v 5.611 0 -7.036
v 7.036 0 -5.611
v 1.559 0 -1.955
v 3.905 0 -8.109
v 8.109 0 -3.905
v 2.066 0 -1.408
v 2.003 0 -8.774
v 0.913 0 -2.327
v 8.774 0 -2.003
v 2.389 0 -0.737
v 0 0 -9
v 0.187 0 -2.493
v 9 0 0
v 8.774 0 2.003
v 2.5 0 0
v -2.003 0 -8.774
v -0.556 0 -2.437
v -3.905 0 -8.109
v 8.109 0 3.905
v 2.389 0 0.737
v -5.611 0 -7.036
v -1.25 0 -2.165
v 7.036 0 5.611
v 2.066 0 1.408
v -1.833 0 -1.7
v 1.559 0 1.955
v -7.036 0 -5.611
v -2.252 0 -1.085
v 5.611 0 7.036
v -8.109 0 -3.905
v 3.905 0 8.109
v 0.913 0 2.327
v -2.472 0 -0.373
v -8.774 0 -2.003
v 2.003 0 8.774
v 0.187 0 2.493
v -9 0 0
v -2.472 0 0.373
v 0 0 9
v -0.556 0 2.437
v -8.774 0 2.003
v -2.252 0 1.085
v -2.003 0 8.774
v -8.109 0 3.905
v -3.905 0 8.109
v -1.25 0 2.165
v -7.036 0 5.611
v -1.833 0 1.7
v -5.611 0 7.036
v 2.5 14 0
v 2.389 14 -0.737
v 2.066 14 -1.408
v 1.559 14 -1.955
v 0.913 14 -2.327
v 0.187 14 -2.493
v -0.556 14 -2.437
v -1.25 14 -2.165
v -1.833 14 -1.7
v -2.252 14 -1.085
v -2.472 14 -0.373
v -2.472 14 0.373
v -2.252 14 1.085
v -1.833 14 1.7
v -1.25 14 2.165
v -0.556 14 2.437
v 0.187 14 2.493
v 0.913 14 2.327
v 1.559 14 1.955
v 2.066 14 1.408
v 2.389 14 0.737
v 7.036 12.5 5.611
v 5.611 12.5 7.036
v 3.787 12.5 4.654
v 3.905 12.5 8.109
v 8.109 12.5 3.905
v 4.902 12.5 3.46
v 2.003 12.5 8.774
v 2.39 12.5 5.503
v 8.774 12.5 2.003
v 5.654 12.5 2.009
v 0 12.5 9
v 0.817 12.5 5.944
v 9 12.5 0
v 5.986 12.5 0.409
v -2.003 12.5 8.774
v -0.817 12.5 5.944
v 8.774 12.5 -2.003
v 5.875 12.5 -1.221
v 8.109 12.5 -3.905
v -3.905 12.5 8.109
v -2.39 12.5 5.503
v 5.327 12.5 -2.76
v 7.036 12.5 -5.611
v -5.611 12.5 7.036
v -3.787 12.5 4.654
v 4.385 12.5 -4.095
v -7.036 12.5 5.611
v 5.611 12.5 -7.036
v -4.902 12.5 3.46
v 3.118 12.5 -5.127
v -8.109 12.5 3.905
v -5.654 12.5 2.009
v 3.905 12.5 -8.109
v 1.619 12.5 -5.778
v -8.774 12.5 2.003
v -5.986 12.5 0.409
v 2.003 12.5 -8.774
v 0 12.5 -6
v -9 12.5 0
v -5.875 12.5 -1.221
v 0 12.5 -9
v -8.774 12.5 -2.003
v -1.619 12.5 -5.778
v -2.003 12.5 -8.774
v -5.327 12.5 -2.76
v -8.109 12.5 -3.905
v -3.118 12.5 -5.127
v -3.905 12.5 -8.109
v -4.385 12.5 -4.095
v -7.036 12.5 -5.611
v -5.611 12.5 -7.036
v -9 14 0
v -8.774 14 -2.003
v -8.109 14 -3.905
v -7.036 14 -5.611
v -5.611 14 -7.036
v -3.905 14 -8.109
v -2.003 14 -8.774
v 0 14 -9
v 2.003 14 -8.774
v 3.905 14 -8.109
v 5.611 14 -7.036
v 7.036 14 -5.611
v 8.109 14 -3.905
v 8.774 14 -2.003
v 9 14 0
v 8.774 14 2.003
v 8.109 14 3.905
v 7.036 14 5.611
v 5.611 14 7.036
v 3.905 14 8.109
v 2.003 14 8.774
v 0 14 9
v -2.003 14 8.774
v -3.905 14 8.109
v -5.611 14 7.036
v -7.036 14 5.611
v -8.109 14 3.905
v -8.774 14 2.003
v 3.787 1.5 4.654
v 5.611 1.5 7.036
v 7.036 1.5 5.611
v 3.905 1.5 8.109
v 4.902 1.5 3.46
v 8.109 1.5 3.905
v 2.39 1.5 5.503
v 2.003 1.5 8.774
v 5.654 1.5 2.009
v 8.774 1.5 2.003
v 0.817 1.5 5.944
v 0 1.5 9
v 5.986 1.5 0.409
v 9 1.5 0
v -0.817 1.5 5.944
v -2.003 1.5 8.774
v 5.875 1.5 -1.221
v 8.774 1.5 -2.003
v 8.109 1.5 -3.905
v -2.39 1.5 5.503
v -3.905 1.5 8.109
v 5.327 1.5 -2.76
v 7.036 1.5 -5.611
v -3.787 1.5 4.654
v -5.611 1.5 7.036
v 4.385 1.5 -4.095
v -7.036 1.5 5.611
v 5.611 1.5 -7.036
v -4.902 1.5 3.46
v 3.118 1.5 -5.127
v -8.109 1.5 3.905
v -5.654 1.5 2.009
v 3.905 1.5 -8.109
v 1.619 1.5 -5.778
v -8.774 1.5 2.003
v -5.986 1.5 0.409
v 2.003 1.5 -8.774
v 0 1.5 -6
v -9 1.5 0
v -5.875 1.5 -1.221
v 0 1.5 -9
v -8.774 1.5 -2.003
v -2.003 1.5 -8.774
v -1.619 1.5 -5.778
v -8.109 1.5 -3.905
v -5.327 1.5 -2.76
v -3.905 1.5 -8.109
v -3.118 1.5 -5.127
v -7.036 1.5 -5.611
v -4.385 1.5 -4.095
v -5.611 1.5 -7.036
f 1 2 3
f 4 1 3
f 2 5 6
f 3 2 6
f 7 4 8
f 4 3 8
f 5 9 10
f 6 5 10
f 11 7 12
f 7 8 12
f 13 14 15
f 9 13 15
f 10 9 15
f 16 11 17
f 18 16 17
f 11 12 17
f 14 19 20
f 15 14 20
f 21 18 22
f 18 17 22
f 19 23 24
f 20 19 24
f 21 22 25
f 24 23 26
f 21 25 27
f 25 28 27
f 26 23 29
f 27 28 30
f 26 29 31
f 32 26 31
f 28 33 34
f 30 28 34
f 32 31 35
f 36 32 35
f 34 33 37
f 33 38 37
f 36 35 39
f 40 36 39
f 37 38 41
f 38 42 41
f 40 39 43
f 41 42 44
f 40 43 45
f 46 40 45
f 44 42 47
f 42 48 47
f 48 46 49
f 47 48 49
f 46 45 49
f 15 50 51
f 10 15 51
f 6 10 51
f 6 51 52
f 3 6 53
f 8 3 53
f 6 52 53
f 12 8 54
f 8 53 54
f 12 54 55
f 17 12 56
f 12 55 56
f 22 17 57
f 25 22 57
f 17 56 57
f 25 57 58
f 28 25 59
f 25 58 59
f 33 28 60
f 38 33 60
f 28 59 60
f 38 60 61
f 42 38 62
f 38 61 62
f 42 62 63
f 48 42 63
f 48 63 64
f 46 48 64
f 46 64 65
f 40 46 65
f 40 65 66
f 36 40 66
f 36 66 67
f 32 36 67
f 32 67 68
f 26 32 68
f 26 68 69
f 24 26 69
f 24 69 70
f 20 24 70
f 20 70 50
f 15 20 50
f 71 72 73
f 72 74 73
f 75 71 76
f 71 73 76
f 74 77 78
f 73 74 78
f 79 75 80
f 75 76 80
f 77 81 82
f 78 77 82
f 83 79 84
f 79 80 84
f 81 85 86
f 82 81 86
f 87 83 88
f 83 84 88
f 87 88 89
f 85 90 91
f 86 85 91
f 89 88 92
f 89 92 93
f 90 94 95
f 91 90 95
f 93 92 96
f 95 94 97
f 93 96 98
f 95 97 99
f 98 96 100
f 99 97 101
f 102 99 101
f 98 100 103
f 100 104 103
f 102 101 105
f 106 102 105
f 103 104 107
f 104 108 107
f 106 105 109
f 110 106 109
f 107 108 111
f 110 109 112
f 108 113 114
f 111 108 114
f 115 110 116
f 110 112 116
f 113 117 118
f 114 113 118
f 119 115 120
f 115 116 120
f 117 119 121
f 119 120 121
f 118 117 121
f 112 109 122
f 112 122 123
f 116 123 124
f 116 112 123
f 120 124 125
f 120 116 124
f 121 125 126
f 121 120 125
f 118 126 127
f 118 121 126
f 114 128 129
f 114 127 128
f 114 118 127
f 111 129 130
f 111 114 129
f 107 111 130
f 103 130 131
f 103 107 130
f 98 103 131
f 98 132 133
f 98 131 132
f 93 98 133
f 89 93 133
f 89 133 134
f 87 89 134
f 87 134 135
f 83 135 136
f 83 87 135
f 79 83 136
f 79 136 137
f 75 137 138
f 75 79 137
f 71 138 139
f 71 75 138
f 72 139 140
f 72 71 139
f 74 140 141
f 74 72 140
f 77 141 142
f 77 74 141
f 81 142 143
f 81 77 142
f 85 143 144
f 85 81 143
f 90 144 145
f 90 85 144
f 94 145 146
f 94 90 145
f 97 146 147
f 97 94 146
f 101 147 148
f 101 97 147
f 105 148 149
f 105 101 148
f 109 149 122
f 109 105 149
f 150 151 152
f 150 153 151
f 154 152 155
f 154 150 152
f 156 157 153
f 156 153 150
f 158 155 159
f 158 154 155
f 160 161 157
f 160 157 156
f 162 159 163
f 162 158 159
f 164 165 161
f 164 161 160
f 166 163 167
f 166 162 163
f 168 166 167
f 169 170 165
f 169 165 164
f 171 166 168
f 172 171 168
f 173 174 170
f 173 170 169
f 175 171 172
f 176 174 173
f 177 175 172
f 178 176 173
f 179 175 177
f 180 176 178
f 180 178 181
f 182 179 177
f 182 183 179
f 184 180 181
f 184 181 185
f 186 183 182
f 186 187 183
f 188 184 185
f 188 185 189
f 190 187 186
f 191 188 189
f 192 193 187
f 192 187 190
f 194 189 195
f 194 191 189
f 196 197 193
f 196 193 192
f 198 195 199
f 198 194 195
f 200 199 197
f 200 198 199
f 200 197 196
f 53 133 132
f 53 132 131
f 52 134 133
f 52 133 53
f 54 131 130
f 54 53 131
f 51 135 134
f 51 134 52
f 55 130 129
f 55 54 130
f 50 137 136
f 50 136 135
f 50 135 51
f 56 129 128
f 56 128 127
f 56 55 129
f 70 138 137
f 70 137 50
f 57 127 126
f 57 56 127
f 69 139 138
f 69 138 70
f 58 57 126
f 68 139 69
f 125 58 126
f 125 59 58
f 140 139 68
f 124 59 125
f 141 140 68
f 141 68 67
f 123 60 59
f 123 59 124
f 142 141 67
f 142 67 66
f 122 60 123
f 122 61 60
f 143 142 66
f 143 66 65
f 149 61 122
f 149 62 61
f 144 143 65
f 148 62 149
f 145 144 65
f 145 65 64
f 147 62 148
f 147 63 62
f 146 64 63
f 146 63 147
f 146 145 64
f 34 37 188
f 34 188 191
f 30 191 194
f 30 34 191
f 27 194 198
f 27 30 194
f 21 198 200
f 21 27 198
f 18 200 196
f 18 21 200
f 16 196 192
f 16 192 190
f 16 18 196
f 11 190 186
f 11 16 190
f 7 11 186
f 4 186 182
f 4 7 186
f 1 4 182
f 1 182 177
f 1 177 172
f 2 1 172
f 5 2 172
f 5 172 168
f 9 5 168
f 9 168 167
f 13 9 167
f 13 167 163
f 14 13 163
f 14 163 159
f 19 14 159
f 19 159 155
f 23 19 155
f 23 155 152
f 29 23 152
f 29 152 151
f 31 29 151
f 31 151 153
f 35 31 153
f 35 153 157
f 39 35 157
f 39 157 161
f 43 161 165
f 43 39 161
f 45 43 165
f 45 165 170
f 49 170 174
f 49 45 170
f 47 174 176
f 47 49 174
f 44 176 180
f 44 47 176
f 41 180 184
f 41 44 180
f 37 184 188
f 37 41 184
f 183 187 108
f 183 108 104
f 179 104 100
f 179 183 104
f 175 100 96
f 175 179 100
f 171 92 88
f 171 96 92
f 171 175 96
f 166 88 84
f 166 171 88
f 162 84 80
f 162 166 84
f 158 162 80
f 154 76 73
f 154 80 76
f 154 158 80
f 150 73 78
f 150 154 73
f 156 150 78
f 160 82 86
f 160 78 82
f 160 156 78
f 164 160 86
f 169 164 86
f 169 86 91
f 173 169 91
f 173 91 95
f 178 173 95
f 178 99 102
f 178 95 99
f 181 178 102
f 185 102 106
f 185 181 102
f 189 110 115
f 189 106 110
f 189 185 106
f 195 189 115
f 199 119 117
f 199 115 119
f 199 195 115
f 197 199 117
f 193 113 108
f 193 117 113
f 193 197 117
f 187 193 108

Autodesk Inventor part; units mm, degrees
ref_plane "YZ Plane" through (0, 0, 0) normal (1, 0, 0) x (0, 1, 0)
ref_plane "XZ Plane" through (0, 0, 0) normal (0, 1, 0) x (-1, 0, 0)
ref_plane "XY Plane" through (0, 0, 0) normal (0, 0, 1) x (1, 0, 0)
sketch "Sketch1" plane through (0, 0, 0) normal (0, 1, 0) x (-1, 0, 0)
  circle A0 centre (0, 0) radius 9
  dimension "d0" = 18
extrude "Extrusion1" add sketch "Sketch1" along normal blind 14
sketch "Sketch2" plane through (0, 14, 0) normal (0, 1, 0) x (1, 0, 0)
  circle A0 centre (0, 0) radius 2.5
  dimension "d3" = 5
extrude "Extrusion2" cut sketch "Sketch2" against normal through all
sketch "Sketch3" plane through (0, 0, 0) normal (1, 0, 0) x (0, 1, 0)
  line L0 (0, 0) -> (14, 0)
  line L1 (14, -9) -> (14, 9) projected
  line L2 (7, 0) -> (7, -9)
  line L3 (0, -9) -> (14, -9) projected
  line L4 (1.5, -12) -> (12.5, -12)
  line L5 (12.5, -12) -> (12.5, -6)
  line L6 (12.5, -6) -> (1.5, -6)
  line L7 (1.5, -6) -> (1.5, -12)
  line L8 (1.5, -12) -> (12.5, -6) construction
  line L9 (12.5, -12) -> (1.5, -6) construction
  dimension "d6" = 14
  dimension "d7" = 11
  dimension "d8" = 6
revolve "Revolution1" cut sketch "Sketch3" angle 360 about axis through (0, 0, 0) along (0, 1, 0) contours L6 L5 L3 L2 | L2 L3 L7 L6 | L3 L5 L4 L7
properties part number "5mm_bore_10mm_width_idlepulley"
